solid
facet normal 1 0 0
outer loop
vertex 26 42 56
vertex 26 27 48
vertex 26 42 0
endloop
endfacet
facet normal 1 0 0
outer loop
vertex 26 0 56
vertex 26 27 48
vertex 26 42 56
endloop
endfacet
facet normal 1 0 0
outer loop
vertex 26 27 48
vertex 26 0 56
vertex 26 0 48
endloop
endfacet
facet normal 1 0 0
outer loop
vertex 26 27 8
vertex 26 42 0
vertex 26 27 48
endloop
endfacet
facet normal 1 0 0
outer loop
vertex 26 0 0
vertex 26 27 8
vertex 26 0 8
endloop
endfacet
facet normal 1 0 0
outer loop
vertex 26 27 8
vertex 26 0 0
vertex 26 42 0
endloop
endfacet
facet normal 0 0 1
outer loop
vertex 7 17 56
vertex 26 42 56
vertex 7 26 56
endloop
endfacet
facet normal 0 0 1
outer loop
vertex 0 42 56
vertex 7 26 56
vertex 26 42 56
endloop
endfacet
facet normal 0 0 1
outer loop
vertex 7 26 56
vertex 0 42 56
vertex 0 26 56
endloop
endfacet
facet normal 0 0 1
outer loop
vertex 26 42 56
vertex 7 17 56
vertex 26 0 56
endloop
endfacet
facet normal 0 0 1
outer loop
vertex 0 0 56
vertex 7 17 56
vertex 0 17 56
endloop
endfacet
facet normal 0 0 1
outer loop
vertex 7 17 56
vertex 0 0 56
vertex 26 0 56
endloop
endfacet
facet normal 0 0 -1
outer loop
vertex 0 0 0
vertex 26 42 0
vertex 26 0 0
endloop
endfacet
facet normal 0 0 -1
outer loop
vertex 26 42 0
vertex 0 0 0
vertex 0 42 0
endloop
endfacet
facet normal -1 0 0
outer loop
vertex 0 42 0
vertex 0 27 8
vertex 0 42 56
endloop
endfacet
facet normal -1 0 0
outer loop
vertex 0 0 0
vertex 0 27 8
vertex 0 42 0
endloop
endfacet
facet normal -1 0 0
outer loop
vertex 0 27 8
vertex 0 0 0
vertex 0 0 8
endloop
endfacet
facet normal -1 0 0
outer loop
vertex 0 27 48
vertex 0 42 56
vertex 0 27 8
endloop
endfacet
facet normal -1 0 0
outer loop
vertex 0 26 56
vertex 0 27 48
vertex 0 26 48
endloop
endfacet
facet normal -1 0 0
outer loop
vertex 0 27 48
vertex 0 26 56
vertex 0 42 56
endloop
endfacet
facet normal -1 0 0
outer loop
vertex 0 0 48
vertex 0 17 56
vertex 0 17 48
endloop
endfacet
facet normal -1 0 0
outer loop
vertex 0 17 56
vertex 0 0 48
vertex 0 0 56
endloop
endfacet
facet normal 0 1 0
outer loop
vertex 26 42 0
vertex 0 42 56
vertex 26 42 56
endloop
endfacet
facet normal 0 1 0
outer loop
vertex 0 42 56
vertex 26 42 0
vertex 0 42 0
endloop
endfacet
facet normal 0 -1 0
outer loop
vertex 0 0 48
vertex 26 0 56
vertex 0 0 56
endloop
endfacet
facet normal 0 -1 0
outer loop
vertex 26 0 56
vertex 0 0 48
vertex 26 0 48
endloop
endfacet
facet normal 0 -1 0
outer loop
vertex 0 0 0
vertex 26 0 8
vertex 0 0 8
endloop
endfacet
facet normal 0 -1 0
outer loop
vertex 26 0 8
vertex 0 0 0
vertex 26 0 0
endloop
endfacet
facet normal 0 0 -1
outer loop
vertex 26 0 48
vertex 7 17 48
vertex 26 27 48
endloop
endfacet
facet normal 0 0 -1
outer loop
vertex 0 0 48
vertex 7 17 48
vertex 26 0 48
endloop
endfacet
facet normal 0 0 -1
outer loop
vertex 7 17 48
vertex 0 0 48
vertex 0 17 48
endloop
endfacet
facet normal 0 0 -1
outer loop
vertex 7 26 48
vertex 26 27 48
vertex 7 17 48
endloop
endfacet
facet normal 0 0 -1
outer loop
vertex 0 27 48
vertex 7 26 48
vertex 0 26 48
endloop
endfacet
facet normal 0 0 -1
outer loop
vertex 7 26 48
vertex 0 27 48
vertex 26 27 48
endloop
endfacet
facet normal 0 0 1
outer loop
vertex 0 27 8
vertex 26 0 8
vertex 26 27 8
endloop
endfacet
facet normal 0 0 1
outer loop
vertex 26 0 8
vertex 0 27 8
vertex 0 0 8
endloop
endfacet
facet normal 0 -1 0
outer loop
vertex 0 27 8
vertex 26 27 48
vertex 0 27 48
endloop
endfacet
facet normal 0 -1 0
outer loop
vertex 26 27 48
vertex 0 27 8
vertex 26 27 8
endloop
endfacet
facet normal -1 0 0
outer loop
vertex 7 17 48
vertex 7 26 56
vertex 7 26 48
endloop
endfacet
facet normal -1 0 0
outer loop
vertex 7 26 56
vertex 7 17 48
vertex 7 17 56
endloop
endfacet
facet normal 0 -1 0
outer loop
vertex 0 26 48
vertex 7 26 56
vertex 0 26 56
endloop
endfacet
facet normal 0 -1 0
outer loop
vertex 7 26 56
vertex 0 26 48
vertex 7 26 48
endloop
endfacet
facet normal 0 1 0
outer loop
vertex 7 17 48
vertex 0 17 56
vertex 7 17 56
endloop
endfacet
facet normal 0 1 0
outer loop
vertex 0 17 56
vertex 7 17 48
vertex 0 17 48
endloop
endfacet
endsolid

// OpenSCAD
difference(){
    
difference(){
difference(){
    cube([26, 42, 56]);
    translate([-1, -1, 8])
    cube([28, 28, 40]);
}
 translate([-1, 17, 56-9])
cube([8, 9, 10]);
}

}
